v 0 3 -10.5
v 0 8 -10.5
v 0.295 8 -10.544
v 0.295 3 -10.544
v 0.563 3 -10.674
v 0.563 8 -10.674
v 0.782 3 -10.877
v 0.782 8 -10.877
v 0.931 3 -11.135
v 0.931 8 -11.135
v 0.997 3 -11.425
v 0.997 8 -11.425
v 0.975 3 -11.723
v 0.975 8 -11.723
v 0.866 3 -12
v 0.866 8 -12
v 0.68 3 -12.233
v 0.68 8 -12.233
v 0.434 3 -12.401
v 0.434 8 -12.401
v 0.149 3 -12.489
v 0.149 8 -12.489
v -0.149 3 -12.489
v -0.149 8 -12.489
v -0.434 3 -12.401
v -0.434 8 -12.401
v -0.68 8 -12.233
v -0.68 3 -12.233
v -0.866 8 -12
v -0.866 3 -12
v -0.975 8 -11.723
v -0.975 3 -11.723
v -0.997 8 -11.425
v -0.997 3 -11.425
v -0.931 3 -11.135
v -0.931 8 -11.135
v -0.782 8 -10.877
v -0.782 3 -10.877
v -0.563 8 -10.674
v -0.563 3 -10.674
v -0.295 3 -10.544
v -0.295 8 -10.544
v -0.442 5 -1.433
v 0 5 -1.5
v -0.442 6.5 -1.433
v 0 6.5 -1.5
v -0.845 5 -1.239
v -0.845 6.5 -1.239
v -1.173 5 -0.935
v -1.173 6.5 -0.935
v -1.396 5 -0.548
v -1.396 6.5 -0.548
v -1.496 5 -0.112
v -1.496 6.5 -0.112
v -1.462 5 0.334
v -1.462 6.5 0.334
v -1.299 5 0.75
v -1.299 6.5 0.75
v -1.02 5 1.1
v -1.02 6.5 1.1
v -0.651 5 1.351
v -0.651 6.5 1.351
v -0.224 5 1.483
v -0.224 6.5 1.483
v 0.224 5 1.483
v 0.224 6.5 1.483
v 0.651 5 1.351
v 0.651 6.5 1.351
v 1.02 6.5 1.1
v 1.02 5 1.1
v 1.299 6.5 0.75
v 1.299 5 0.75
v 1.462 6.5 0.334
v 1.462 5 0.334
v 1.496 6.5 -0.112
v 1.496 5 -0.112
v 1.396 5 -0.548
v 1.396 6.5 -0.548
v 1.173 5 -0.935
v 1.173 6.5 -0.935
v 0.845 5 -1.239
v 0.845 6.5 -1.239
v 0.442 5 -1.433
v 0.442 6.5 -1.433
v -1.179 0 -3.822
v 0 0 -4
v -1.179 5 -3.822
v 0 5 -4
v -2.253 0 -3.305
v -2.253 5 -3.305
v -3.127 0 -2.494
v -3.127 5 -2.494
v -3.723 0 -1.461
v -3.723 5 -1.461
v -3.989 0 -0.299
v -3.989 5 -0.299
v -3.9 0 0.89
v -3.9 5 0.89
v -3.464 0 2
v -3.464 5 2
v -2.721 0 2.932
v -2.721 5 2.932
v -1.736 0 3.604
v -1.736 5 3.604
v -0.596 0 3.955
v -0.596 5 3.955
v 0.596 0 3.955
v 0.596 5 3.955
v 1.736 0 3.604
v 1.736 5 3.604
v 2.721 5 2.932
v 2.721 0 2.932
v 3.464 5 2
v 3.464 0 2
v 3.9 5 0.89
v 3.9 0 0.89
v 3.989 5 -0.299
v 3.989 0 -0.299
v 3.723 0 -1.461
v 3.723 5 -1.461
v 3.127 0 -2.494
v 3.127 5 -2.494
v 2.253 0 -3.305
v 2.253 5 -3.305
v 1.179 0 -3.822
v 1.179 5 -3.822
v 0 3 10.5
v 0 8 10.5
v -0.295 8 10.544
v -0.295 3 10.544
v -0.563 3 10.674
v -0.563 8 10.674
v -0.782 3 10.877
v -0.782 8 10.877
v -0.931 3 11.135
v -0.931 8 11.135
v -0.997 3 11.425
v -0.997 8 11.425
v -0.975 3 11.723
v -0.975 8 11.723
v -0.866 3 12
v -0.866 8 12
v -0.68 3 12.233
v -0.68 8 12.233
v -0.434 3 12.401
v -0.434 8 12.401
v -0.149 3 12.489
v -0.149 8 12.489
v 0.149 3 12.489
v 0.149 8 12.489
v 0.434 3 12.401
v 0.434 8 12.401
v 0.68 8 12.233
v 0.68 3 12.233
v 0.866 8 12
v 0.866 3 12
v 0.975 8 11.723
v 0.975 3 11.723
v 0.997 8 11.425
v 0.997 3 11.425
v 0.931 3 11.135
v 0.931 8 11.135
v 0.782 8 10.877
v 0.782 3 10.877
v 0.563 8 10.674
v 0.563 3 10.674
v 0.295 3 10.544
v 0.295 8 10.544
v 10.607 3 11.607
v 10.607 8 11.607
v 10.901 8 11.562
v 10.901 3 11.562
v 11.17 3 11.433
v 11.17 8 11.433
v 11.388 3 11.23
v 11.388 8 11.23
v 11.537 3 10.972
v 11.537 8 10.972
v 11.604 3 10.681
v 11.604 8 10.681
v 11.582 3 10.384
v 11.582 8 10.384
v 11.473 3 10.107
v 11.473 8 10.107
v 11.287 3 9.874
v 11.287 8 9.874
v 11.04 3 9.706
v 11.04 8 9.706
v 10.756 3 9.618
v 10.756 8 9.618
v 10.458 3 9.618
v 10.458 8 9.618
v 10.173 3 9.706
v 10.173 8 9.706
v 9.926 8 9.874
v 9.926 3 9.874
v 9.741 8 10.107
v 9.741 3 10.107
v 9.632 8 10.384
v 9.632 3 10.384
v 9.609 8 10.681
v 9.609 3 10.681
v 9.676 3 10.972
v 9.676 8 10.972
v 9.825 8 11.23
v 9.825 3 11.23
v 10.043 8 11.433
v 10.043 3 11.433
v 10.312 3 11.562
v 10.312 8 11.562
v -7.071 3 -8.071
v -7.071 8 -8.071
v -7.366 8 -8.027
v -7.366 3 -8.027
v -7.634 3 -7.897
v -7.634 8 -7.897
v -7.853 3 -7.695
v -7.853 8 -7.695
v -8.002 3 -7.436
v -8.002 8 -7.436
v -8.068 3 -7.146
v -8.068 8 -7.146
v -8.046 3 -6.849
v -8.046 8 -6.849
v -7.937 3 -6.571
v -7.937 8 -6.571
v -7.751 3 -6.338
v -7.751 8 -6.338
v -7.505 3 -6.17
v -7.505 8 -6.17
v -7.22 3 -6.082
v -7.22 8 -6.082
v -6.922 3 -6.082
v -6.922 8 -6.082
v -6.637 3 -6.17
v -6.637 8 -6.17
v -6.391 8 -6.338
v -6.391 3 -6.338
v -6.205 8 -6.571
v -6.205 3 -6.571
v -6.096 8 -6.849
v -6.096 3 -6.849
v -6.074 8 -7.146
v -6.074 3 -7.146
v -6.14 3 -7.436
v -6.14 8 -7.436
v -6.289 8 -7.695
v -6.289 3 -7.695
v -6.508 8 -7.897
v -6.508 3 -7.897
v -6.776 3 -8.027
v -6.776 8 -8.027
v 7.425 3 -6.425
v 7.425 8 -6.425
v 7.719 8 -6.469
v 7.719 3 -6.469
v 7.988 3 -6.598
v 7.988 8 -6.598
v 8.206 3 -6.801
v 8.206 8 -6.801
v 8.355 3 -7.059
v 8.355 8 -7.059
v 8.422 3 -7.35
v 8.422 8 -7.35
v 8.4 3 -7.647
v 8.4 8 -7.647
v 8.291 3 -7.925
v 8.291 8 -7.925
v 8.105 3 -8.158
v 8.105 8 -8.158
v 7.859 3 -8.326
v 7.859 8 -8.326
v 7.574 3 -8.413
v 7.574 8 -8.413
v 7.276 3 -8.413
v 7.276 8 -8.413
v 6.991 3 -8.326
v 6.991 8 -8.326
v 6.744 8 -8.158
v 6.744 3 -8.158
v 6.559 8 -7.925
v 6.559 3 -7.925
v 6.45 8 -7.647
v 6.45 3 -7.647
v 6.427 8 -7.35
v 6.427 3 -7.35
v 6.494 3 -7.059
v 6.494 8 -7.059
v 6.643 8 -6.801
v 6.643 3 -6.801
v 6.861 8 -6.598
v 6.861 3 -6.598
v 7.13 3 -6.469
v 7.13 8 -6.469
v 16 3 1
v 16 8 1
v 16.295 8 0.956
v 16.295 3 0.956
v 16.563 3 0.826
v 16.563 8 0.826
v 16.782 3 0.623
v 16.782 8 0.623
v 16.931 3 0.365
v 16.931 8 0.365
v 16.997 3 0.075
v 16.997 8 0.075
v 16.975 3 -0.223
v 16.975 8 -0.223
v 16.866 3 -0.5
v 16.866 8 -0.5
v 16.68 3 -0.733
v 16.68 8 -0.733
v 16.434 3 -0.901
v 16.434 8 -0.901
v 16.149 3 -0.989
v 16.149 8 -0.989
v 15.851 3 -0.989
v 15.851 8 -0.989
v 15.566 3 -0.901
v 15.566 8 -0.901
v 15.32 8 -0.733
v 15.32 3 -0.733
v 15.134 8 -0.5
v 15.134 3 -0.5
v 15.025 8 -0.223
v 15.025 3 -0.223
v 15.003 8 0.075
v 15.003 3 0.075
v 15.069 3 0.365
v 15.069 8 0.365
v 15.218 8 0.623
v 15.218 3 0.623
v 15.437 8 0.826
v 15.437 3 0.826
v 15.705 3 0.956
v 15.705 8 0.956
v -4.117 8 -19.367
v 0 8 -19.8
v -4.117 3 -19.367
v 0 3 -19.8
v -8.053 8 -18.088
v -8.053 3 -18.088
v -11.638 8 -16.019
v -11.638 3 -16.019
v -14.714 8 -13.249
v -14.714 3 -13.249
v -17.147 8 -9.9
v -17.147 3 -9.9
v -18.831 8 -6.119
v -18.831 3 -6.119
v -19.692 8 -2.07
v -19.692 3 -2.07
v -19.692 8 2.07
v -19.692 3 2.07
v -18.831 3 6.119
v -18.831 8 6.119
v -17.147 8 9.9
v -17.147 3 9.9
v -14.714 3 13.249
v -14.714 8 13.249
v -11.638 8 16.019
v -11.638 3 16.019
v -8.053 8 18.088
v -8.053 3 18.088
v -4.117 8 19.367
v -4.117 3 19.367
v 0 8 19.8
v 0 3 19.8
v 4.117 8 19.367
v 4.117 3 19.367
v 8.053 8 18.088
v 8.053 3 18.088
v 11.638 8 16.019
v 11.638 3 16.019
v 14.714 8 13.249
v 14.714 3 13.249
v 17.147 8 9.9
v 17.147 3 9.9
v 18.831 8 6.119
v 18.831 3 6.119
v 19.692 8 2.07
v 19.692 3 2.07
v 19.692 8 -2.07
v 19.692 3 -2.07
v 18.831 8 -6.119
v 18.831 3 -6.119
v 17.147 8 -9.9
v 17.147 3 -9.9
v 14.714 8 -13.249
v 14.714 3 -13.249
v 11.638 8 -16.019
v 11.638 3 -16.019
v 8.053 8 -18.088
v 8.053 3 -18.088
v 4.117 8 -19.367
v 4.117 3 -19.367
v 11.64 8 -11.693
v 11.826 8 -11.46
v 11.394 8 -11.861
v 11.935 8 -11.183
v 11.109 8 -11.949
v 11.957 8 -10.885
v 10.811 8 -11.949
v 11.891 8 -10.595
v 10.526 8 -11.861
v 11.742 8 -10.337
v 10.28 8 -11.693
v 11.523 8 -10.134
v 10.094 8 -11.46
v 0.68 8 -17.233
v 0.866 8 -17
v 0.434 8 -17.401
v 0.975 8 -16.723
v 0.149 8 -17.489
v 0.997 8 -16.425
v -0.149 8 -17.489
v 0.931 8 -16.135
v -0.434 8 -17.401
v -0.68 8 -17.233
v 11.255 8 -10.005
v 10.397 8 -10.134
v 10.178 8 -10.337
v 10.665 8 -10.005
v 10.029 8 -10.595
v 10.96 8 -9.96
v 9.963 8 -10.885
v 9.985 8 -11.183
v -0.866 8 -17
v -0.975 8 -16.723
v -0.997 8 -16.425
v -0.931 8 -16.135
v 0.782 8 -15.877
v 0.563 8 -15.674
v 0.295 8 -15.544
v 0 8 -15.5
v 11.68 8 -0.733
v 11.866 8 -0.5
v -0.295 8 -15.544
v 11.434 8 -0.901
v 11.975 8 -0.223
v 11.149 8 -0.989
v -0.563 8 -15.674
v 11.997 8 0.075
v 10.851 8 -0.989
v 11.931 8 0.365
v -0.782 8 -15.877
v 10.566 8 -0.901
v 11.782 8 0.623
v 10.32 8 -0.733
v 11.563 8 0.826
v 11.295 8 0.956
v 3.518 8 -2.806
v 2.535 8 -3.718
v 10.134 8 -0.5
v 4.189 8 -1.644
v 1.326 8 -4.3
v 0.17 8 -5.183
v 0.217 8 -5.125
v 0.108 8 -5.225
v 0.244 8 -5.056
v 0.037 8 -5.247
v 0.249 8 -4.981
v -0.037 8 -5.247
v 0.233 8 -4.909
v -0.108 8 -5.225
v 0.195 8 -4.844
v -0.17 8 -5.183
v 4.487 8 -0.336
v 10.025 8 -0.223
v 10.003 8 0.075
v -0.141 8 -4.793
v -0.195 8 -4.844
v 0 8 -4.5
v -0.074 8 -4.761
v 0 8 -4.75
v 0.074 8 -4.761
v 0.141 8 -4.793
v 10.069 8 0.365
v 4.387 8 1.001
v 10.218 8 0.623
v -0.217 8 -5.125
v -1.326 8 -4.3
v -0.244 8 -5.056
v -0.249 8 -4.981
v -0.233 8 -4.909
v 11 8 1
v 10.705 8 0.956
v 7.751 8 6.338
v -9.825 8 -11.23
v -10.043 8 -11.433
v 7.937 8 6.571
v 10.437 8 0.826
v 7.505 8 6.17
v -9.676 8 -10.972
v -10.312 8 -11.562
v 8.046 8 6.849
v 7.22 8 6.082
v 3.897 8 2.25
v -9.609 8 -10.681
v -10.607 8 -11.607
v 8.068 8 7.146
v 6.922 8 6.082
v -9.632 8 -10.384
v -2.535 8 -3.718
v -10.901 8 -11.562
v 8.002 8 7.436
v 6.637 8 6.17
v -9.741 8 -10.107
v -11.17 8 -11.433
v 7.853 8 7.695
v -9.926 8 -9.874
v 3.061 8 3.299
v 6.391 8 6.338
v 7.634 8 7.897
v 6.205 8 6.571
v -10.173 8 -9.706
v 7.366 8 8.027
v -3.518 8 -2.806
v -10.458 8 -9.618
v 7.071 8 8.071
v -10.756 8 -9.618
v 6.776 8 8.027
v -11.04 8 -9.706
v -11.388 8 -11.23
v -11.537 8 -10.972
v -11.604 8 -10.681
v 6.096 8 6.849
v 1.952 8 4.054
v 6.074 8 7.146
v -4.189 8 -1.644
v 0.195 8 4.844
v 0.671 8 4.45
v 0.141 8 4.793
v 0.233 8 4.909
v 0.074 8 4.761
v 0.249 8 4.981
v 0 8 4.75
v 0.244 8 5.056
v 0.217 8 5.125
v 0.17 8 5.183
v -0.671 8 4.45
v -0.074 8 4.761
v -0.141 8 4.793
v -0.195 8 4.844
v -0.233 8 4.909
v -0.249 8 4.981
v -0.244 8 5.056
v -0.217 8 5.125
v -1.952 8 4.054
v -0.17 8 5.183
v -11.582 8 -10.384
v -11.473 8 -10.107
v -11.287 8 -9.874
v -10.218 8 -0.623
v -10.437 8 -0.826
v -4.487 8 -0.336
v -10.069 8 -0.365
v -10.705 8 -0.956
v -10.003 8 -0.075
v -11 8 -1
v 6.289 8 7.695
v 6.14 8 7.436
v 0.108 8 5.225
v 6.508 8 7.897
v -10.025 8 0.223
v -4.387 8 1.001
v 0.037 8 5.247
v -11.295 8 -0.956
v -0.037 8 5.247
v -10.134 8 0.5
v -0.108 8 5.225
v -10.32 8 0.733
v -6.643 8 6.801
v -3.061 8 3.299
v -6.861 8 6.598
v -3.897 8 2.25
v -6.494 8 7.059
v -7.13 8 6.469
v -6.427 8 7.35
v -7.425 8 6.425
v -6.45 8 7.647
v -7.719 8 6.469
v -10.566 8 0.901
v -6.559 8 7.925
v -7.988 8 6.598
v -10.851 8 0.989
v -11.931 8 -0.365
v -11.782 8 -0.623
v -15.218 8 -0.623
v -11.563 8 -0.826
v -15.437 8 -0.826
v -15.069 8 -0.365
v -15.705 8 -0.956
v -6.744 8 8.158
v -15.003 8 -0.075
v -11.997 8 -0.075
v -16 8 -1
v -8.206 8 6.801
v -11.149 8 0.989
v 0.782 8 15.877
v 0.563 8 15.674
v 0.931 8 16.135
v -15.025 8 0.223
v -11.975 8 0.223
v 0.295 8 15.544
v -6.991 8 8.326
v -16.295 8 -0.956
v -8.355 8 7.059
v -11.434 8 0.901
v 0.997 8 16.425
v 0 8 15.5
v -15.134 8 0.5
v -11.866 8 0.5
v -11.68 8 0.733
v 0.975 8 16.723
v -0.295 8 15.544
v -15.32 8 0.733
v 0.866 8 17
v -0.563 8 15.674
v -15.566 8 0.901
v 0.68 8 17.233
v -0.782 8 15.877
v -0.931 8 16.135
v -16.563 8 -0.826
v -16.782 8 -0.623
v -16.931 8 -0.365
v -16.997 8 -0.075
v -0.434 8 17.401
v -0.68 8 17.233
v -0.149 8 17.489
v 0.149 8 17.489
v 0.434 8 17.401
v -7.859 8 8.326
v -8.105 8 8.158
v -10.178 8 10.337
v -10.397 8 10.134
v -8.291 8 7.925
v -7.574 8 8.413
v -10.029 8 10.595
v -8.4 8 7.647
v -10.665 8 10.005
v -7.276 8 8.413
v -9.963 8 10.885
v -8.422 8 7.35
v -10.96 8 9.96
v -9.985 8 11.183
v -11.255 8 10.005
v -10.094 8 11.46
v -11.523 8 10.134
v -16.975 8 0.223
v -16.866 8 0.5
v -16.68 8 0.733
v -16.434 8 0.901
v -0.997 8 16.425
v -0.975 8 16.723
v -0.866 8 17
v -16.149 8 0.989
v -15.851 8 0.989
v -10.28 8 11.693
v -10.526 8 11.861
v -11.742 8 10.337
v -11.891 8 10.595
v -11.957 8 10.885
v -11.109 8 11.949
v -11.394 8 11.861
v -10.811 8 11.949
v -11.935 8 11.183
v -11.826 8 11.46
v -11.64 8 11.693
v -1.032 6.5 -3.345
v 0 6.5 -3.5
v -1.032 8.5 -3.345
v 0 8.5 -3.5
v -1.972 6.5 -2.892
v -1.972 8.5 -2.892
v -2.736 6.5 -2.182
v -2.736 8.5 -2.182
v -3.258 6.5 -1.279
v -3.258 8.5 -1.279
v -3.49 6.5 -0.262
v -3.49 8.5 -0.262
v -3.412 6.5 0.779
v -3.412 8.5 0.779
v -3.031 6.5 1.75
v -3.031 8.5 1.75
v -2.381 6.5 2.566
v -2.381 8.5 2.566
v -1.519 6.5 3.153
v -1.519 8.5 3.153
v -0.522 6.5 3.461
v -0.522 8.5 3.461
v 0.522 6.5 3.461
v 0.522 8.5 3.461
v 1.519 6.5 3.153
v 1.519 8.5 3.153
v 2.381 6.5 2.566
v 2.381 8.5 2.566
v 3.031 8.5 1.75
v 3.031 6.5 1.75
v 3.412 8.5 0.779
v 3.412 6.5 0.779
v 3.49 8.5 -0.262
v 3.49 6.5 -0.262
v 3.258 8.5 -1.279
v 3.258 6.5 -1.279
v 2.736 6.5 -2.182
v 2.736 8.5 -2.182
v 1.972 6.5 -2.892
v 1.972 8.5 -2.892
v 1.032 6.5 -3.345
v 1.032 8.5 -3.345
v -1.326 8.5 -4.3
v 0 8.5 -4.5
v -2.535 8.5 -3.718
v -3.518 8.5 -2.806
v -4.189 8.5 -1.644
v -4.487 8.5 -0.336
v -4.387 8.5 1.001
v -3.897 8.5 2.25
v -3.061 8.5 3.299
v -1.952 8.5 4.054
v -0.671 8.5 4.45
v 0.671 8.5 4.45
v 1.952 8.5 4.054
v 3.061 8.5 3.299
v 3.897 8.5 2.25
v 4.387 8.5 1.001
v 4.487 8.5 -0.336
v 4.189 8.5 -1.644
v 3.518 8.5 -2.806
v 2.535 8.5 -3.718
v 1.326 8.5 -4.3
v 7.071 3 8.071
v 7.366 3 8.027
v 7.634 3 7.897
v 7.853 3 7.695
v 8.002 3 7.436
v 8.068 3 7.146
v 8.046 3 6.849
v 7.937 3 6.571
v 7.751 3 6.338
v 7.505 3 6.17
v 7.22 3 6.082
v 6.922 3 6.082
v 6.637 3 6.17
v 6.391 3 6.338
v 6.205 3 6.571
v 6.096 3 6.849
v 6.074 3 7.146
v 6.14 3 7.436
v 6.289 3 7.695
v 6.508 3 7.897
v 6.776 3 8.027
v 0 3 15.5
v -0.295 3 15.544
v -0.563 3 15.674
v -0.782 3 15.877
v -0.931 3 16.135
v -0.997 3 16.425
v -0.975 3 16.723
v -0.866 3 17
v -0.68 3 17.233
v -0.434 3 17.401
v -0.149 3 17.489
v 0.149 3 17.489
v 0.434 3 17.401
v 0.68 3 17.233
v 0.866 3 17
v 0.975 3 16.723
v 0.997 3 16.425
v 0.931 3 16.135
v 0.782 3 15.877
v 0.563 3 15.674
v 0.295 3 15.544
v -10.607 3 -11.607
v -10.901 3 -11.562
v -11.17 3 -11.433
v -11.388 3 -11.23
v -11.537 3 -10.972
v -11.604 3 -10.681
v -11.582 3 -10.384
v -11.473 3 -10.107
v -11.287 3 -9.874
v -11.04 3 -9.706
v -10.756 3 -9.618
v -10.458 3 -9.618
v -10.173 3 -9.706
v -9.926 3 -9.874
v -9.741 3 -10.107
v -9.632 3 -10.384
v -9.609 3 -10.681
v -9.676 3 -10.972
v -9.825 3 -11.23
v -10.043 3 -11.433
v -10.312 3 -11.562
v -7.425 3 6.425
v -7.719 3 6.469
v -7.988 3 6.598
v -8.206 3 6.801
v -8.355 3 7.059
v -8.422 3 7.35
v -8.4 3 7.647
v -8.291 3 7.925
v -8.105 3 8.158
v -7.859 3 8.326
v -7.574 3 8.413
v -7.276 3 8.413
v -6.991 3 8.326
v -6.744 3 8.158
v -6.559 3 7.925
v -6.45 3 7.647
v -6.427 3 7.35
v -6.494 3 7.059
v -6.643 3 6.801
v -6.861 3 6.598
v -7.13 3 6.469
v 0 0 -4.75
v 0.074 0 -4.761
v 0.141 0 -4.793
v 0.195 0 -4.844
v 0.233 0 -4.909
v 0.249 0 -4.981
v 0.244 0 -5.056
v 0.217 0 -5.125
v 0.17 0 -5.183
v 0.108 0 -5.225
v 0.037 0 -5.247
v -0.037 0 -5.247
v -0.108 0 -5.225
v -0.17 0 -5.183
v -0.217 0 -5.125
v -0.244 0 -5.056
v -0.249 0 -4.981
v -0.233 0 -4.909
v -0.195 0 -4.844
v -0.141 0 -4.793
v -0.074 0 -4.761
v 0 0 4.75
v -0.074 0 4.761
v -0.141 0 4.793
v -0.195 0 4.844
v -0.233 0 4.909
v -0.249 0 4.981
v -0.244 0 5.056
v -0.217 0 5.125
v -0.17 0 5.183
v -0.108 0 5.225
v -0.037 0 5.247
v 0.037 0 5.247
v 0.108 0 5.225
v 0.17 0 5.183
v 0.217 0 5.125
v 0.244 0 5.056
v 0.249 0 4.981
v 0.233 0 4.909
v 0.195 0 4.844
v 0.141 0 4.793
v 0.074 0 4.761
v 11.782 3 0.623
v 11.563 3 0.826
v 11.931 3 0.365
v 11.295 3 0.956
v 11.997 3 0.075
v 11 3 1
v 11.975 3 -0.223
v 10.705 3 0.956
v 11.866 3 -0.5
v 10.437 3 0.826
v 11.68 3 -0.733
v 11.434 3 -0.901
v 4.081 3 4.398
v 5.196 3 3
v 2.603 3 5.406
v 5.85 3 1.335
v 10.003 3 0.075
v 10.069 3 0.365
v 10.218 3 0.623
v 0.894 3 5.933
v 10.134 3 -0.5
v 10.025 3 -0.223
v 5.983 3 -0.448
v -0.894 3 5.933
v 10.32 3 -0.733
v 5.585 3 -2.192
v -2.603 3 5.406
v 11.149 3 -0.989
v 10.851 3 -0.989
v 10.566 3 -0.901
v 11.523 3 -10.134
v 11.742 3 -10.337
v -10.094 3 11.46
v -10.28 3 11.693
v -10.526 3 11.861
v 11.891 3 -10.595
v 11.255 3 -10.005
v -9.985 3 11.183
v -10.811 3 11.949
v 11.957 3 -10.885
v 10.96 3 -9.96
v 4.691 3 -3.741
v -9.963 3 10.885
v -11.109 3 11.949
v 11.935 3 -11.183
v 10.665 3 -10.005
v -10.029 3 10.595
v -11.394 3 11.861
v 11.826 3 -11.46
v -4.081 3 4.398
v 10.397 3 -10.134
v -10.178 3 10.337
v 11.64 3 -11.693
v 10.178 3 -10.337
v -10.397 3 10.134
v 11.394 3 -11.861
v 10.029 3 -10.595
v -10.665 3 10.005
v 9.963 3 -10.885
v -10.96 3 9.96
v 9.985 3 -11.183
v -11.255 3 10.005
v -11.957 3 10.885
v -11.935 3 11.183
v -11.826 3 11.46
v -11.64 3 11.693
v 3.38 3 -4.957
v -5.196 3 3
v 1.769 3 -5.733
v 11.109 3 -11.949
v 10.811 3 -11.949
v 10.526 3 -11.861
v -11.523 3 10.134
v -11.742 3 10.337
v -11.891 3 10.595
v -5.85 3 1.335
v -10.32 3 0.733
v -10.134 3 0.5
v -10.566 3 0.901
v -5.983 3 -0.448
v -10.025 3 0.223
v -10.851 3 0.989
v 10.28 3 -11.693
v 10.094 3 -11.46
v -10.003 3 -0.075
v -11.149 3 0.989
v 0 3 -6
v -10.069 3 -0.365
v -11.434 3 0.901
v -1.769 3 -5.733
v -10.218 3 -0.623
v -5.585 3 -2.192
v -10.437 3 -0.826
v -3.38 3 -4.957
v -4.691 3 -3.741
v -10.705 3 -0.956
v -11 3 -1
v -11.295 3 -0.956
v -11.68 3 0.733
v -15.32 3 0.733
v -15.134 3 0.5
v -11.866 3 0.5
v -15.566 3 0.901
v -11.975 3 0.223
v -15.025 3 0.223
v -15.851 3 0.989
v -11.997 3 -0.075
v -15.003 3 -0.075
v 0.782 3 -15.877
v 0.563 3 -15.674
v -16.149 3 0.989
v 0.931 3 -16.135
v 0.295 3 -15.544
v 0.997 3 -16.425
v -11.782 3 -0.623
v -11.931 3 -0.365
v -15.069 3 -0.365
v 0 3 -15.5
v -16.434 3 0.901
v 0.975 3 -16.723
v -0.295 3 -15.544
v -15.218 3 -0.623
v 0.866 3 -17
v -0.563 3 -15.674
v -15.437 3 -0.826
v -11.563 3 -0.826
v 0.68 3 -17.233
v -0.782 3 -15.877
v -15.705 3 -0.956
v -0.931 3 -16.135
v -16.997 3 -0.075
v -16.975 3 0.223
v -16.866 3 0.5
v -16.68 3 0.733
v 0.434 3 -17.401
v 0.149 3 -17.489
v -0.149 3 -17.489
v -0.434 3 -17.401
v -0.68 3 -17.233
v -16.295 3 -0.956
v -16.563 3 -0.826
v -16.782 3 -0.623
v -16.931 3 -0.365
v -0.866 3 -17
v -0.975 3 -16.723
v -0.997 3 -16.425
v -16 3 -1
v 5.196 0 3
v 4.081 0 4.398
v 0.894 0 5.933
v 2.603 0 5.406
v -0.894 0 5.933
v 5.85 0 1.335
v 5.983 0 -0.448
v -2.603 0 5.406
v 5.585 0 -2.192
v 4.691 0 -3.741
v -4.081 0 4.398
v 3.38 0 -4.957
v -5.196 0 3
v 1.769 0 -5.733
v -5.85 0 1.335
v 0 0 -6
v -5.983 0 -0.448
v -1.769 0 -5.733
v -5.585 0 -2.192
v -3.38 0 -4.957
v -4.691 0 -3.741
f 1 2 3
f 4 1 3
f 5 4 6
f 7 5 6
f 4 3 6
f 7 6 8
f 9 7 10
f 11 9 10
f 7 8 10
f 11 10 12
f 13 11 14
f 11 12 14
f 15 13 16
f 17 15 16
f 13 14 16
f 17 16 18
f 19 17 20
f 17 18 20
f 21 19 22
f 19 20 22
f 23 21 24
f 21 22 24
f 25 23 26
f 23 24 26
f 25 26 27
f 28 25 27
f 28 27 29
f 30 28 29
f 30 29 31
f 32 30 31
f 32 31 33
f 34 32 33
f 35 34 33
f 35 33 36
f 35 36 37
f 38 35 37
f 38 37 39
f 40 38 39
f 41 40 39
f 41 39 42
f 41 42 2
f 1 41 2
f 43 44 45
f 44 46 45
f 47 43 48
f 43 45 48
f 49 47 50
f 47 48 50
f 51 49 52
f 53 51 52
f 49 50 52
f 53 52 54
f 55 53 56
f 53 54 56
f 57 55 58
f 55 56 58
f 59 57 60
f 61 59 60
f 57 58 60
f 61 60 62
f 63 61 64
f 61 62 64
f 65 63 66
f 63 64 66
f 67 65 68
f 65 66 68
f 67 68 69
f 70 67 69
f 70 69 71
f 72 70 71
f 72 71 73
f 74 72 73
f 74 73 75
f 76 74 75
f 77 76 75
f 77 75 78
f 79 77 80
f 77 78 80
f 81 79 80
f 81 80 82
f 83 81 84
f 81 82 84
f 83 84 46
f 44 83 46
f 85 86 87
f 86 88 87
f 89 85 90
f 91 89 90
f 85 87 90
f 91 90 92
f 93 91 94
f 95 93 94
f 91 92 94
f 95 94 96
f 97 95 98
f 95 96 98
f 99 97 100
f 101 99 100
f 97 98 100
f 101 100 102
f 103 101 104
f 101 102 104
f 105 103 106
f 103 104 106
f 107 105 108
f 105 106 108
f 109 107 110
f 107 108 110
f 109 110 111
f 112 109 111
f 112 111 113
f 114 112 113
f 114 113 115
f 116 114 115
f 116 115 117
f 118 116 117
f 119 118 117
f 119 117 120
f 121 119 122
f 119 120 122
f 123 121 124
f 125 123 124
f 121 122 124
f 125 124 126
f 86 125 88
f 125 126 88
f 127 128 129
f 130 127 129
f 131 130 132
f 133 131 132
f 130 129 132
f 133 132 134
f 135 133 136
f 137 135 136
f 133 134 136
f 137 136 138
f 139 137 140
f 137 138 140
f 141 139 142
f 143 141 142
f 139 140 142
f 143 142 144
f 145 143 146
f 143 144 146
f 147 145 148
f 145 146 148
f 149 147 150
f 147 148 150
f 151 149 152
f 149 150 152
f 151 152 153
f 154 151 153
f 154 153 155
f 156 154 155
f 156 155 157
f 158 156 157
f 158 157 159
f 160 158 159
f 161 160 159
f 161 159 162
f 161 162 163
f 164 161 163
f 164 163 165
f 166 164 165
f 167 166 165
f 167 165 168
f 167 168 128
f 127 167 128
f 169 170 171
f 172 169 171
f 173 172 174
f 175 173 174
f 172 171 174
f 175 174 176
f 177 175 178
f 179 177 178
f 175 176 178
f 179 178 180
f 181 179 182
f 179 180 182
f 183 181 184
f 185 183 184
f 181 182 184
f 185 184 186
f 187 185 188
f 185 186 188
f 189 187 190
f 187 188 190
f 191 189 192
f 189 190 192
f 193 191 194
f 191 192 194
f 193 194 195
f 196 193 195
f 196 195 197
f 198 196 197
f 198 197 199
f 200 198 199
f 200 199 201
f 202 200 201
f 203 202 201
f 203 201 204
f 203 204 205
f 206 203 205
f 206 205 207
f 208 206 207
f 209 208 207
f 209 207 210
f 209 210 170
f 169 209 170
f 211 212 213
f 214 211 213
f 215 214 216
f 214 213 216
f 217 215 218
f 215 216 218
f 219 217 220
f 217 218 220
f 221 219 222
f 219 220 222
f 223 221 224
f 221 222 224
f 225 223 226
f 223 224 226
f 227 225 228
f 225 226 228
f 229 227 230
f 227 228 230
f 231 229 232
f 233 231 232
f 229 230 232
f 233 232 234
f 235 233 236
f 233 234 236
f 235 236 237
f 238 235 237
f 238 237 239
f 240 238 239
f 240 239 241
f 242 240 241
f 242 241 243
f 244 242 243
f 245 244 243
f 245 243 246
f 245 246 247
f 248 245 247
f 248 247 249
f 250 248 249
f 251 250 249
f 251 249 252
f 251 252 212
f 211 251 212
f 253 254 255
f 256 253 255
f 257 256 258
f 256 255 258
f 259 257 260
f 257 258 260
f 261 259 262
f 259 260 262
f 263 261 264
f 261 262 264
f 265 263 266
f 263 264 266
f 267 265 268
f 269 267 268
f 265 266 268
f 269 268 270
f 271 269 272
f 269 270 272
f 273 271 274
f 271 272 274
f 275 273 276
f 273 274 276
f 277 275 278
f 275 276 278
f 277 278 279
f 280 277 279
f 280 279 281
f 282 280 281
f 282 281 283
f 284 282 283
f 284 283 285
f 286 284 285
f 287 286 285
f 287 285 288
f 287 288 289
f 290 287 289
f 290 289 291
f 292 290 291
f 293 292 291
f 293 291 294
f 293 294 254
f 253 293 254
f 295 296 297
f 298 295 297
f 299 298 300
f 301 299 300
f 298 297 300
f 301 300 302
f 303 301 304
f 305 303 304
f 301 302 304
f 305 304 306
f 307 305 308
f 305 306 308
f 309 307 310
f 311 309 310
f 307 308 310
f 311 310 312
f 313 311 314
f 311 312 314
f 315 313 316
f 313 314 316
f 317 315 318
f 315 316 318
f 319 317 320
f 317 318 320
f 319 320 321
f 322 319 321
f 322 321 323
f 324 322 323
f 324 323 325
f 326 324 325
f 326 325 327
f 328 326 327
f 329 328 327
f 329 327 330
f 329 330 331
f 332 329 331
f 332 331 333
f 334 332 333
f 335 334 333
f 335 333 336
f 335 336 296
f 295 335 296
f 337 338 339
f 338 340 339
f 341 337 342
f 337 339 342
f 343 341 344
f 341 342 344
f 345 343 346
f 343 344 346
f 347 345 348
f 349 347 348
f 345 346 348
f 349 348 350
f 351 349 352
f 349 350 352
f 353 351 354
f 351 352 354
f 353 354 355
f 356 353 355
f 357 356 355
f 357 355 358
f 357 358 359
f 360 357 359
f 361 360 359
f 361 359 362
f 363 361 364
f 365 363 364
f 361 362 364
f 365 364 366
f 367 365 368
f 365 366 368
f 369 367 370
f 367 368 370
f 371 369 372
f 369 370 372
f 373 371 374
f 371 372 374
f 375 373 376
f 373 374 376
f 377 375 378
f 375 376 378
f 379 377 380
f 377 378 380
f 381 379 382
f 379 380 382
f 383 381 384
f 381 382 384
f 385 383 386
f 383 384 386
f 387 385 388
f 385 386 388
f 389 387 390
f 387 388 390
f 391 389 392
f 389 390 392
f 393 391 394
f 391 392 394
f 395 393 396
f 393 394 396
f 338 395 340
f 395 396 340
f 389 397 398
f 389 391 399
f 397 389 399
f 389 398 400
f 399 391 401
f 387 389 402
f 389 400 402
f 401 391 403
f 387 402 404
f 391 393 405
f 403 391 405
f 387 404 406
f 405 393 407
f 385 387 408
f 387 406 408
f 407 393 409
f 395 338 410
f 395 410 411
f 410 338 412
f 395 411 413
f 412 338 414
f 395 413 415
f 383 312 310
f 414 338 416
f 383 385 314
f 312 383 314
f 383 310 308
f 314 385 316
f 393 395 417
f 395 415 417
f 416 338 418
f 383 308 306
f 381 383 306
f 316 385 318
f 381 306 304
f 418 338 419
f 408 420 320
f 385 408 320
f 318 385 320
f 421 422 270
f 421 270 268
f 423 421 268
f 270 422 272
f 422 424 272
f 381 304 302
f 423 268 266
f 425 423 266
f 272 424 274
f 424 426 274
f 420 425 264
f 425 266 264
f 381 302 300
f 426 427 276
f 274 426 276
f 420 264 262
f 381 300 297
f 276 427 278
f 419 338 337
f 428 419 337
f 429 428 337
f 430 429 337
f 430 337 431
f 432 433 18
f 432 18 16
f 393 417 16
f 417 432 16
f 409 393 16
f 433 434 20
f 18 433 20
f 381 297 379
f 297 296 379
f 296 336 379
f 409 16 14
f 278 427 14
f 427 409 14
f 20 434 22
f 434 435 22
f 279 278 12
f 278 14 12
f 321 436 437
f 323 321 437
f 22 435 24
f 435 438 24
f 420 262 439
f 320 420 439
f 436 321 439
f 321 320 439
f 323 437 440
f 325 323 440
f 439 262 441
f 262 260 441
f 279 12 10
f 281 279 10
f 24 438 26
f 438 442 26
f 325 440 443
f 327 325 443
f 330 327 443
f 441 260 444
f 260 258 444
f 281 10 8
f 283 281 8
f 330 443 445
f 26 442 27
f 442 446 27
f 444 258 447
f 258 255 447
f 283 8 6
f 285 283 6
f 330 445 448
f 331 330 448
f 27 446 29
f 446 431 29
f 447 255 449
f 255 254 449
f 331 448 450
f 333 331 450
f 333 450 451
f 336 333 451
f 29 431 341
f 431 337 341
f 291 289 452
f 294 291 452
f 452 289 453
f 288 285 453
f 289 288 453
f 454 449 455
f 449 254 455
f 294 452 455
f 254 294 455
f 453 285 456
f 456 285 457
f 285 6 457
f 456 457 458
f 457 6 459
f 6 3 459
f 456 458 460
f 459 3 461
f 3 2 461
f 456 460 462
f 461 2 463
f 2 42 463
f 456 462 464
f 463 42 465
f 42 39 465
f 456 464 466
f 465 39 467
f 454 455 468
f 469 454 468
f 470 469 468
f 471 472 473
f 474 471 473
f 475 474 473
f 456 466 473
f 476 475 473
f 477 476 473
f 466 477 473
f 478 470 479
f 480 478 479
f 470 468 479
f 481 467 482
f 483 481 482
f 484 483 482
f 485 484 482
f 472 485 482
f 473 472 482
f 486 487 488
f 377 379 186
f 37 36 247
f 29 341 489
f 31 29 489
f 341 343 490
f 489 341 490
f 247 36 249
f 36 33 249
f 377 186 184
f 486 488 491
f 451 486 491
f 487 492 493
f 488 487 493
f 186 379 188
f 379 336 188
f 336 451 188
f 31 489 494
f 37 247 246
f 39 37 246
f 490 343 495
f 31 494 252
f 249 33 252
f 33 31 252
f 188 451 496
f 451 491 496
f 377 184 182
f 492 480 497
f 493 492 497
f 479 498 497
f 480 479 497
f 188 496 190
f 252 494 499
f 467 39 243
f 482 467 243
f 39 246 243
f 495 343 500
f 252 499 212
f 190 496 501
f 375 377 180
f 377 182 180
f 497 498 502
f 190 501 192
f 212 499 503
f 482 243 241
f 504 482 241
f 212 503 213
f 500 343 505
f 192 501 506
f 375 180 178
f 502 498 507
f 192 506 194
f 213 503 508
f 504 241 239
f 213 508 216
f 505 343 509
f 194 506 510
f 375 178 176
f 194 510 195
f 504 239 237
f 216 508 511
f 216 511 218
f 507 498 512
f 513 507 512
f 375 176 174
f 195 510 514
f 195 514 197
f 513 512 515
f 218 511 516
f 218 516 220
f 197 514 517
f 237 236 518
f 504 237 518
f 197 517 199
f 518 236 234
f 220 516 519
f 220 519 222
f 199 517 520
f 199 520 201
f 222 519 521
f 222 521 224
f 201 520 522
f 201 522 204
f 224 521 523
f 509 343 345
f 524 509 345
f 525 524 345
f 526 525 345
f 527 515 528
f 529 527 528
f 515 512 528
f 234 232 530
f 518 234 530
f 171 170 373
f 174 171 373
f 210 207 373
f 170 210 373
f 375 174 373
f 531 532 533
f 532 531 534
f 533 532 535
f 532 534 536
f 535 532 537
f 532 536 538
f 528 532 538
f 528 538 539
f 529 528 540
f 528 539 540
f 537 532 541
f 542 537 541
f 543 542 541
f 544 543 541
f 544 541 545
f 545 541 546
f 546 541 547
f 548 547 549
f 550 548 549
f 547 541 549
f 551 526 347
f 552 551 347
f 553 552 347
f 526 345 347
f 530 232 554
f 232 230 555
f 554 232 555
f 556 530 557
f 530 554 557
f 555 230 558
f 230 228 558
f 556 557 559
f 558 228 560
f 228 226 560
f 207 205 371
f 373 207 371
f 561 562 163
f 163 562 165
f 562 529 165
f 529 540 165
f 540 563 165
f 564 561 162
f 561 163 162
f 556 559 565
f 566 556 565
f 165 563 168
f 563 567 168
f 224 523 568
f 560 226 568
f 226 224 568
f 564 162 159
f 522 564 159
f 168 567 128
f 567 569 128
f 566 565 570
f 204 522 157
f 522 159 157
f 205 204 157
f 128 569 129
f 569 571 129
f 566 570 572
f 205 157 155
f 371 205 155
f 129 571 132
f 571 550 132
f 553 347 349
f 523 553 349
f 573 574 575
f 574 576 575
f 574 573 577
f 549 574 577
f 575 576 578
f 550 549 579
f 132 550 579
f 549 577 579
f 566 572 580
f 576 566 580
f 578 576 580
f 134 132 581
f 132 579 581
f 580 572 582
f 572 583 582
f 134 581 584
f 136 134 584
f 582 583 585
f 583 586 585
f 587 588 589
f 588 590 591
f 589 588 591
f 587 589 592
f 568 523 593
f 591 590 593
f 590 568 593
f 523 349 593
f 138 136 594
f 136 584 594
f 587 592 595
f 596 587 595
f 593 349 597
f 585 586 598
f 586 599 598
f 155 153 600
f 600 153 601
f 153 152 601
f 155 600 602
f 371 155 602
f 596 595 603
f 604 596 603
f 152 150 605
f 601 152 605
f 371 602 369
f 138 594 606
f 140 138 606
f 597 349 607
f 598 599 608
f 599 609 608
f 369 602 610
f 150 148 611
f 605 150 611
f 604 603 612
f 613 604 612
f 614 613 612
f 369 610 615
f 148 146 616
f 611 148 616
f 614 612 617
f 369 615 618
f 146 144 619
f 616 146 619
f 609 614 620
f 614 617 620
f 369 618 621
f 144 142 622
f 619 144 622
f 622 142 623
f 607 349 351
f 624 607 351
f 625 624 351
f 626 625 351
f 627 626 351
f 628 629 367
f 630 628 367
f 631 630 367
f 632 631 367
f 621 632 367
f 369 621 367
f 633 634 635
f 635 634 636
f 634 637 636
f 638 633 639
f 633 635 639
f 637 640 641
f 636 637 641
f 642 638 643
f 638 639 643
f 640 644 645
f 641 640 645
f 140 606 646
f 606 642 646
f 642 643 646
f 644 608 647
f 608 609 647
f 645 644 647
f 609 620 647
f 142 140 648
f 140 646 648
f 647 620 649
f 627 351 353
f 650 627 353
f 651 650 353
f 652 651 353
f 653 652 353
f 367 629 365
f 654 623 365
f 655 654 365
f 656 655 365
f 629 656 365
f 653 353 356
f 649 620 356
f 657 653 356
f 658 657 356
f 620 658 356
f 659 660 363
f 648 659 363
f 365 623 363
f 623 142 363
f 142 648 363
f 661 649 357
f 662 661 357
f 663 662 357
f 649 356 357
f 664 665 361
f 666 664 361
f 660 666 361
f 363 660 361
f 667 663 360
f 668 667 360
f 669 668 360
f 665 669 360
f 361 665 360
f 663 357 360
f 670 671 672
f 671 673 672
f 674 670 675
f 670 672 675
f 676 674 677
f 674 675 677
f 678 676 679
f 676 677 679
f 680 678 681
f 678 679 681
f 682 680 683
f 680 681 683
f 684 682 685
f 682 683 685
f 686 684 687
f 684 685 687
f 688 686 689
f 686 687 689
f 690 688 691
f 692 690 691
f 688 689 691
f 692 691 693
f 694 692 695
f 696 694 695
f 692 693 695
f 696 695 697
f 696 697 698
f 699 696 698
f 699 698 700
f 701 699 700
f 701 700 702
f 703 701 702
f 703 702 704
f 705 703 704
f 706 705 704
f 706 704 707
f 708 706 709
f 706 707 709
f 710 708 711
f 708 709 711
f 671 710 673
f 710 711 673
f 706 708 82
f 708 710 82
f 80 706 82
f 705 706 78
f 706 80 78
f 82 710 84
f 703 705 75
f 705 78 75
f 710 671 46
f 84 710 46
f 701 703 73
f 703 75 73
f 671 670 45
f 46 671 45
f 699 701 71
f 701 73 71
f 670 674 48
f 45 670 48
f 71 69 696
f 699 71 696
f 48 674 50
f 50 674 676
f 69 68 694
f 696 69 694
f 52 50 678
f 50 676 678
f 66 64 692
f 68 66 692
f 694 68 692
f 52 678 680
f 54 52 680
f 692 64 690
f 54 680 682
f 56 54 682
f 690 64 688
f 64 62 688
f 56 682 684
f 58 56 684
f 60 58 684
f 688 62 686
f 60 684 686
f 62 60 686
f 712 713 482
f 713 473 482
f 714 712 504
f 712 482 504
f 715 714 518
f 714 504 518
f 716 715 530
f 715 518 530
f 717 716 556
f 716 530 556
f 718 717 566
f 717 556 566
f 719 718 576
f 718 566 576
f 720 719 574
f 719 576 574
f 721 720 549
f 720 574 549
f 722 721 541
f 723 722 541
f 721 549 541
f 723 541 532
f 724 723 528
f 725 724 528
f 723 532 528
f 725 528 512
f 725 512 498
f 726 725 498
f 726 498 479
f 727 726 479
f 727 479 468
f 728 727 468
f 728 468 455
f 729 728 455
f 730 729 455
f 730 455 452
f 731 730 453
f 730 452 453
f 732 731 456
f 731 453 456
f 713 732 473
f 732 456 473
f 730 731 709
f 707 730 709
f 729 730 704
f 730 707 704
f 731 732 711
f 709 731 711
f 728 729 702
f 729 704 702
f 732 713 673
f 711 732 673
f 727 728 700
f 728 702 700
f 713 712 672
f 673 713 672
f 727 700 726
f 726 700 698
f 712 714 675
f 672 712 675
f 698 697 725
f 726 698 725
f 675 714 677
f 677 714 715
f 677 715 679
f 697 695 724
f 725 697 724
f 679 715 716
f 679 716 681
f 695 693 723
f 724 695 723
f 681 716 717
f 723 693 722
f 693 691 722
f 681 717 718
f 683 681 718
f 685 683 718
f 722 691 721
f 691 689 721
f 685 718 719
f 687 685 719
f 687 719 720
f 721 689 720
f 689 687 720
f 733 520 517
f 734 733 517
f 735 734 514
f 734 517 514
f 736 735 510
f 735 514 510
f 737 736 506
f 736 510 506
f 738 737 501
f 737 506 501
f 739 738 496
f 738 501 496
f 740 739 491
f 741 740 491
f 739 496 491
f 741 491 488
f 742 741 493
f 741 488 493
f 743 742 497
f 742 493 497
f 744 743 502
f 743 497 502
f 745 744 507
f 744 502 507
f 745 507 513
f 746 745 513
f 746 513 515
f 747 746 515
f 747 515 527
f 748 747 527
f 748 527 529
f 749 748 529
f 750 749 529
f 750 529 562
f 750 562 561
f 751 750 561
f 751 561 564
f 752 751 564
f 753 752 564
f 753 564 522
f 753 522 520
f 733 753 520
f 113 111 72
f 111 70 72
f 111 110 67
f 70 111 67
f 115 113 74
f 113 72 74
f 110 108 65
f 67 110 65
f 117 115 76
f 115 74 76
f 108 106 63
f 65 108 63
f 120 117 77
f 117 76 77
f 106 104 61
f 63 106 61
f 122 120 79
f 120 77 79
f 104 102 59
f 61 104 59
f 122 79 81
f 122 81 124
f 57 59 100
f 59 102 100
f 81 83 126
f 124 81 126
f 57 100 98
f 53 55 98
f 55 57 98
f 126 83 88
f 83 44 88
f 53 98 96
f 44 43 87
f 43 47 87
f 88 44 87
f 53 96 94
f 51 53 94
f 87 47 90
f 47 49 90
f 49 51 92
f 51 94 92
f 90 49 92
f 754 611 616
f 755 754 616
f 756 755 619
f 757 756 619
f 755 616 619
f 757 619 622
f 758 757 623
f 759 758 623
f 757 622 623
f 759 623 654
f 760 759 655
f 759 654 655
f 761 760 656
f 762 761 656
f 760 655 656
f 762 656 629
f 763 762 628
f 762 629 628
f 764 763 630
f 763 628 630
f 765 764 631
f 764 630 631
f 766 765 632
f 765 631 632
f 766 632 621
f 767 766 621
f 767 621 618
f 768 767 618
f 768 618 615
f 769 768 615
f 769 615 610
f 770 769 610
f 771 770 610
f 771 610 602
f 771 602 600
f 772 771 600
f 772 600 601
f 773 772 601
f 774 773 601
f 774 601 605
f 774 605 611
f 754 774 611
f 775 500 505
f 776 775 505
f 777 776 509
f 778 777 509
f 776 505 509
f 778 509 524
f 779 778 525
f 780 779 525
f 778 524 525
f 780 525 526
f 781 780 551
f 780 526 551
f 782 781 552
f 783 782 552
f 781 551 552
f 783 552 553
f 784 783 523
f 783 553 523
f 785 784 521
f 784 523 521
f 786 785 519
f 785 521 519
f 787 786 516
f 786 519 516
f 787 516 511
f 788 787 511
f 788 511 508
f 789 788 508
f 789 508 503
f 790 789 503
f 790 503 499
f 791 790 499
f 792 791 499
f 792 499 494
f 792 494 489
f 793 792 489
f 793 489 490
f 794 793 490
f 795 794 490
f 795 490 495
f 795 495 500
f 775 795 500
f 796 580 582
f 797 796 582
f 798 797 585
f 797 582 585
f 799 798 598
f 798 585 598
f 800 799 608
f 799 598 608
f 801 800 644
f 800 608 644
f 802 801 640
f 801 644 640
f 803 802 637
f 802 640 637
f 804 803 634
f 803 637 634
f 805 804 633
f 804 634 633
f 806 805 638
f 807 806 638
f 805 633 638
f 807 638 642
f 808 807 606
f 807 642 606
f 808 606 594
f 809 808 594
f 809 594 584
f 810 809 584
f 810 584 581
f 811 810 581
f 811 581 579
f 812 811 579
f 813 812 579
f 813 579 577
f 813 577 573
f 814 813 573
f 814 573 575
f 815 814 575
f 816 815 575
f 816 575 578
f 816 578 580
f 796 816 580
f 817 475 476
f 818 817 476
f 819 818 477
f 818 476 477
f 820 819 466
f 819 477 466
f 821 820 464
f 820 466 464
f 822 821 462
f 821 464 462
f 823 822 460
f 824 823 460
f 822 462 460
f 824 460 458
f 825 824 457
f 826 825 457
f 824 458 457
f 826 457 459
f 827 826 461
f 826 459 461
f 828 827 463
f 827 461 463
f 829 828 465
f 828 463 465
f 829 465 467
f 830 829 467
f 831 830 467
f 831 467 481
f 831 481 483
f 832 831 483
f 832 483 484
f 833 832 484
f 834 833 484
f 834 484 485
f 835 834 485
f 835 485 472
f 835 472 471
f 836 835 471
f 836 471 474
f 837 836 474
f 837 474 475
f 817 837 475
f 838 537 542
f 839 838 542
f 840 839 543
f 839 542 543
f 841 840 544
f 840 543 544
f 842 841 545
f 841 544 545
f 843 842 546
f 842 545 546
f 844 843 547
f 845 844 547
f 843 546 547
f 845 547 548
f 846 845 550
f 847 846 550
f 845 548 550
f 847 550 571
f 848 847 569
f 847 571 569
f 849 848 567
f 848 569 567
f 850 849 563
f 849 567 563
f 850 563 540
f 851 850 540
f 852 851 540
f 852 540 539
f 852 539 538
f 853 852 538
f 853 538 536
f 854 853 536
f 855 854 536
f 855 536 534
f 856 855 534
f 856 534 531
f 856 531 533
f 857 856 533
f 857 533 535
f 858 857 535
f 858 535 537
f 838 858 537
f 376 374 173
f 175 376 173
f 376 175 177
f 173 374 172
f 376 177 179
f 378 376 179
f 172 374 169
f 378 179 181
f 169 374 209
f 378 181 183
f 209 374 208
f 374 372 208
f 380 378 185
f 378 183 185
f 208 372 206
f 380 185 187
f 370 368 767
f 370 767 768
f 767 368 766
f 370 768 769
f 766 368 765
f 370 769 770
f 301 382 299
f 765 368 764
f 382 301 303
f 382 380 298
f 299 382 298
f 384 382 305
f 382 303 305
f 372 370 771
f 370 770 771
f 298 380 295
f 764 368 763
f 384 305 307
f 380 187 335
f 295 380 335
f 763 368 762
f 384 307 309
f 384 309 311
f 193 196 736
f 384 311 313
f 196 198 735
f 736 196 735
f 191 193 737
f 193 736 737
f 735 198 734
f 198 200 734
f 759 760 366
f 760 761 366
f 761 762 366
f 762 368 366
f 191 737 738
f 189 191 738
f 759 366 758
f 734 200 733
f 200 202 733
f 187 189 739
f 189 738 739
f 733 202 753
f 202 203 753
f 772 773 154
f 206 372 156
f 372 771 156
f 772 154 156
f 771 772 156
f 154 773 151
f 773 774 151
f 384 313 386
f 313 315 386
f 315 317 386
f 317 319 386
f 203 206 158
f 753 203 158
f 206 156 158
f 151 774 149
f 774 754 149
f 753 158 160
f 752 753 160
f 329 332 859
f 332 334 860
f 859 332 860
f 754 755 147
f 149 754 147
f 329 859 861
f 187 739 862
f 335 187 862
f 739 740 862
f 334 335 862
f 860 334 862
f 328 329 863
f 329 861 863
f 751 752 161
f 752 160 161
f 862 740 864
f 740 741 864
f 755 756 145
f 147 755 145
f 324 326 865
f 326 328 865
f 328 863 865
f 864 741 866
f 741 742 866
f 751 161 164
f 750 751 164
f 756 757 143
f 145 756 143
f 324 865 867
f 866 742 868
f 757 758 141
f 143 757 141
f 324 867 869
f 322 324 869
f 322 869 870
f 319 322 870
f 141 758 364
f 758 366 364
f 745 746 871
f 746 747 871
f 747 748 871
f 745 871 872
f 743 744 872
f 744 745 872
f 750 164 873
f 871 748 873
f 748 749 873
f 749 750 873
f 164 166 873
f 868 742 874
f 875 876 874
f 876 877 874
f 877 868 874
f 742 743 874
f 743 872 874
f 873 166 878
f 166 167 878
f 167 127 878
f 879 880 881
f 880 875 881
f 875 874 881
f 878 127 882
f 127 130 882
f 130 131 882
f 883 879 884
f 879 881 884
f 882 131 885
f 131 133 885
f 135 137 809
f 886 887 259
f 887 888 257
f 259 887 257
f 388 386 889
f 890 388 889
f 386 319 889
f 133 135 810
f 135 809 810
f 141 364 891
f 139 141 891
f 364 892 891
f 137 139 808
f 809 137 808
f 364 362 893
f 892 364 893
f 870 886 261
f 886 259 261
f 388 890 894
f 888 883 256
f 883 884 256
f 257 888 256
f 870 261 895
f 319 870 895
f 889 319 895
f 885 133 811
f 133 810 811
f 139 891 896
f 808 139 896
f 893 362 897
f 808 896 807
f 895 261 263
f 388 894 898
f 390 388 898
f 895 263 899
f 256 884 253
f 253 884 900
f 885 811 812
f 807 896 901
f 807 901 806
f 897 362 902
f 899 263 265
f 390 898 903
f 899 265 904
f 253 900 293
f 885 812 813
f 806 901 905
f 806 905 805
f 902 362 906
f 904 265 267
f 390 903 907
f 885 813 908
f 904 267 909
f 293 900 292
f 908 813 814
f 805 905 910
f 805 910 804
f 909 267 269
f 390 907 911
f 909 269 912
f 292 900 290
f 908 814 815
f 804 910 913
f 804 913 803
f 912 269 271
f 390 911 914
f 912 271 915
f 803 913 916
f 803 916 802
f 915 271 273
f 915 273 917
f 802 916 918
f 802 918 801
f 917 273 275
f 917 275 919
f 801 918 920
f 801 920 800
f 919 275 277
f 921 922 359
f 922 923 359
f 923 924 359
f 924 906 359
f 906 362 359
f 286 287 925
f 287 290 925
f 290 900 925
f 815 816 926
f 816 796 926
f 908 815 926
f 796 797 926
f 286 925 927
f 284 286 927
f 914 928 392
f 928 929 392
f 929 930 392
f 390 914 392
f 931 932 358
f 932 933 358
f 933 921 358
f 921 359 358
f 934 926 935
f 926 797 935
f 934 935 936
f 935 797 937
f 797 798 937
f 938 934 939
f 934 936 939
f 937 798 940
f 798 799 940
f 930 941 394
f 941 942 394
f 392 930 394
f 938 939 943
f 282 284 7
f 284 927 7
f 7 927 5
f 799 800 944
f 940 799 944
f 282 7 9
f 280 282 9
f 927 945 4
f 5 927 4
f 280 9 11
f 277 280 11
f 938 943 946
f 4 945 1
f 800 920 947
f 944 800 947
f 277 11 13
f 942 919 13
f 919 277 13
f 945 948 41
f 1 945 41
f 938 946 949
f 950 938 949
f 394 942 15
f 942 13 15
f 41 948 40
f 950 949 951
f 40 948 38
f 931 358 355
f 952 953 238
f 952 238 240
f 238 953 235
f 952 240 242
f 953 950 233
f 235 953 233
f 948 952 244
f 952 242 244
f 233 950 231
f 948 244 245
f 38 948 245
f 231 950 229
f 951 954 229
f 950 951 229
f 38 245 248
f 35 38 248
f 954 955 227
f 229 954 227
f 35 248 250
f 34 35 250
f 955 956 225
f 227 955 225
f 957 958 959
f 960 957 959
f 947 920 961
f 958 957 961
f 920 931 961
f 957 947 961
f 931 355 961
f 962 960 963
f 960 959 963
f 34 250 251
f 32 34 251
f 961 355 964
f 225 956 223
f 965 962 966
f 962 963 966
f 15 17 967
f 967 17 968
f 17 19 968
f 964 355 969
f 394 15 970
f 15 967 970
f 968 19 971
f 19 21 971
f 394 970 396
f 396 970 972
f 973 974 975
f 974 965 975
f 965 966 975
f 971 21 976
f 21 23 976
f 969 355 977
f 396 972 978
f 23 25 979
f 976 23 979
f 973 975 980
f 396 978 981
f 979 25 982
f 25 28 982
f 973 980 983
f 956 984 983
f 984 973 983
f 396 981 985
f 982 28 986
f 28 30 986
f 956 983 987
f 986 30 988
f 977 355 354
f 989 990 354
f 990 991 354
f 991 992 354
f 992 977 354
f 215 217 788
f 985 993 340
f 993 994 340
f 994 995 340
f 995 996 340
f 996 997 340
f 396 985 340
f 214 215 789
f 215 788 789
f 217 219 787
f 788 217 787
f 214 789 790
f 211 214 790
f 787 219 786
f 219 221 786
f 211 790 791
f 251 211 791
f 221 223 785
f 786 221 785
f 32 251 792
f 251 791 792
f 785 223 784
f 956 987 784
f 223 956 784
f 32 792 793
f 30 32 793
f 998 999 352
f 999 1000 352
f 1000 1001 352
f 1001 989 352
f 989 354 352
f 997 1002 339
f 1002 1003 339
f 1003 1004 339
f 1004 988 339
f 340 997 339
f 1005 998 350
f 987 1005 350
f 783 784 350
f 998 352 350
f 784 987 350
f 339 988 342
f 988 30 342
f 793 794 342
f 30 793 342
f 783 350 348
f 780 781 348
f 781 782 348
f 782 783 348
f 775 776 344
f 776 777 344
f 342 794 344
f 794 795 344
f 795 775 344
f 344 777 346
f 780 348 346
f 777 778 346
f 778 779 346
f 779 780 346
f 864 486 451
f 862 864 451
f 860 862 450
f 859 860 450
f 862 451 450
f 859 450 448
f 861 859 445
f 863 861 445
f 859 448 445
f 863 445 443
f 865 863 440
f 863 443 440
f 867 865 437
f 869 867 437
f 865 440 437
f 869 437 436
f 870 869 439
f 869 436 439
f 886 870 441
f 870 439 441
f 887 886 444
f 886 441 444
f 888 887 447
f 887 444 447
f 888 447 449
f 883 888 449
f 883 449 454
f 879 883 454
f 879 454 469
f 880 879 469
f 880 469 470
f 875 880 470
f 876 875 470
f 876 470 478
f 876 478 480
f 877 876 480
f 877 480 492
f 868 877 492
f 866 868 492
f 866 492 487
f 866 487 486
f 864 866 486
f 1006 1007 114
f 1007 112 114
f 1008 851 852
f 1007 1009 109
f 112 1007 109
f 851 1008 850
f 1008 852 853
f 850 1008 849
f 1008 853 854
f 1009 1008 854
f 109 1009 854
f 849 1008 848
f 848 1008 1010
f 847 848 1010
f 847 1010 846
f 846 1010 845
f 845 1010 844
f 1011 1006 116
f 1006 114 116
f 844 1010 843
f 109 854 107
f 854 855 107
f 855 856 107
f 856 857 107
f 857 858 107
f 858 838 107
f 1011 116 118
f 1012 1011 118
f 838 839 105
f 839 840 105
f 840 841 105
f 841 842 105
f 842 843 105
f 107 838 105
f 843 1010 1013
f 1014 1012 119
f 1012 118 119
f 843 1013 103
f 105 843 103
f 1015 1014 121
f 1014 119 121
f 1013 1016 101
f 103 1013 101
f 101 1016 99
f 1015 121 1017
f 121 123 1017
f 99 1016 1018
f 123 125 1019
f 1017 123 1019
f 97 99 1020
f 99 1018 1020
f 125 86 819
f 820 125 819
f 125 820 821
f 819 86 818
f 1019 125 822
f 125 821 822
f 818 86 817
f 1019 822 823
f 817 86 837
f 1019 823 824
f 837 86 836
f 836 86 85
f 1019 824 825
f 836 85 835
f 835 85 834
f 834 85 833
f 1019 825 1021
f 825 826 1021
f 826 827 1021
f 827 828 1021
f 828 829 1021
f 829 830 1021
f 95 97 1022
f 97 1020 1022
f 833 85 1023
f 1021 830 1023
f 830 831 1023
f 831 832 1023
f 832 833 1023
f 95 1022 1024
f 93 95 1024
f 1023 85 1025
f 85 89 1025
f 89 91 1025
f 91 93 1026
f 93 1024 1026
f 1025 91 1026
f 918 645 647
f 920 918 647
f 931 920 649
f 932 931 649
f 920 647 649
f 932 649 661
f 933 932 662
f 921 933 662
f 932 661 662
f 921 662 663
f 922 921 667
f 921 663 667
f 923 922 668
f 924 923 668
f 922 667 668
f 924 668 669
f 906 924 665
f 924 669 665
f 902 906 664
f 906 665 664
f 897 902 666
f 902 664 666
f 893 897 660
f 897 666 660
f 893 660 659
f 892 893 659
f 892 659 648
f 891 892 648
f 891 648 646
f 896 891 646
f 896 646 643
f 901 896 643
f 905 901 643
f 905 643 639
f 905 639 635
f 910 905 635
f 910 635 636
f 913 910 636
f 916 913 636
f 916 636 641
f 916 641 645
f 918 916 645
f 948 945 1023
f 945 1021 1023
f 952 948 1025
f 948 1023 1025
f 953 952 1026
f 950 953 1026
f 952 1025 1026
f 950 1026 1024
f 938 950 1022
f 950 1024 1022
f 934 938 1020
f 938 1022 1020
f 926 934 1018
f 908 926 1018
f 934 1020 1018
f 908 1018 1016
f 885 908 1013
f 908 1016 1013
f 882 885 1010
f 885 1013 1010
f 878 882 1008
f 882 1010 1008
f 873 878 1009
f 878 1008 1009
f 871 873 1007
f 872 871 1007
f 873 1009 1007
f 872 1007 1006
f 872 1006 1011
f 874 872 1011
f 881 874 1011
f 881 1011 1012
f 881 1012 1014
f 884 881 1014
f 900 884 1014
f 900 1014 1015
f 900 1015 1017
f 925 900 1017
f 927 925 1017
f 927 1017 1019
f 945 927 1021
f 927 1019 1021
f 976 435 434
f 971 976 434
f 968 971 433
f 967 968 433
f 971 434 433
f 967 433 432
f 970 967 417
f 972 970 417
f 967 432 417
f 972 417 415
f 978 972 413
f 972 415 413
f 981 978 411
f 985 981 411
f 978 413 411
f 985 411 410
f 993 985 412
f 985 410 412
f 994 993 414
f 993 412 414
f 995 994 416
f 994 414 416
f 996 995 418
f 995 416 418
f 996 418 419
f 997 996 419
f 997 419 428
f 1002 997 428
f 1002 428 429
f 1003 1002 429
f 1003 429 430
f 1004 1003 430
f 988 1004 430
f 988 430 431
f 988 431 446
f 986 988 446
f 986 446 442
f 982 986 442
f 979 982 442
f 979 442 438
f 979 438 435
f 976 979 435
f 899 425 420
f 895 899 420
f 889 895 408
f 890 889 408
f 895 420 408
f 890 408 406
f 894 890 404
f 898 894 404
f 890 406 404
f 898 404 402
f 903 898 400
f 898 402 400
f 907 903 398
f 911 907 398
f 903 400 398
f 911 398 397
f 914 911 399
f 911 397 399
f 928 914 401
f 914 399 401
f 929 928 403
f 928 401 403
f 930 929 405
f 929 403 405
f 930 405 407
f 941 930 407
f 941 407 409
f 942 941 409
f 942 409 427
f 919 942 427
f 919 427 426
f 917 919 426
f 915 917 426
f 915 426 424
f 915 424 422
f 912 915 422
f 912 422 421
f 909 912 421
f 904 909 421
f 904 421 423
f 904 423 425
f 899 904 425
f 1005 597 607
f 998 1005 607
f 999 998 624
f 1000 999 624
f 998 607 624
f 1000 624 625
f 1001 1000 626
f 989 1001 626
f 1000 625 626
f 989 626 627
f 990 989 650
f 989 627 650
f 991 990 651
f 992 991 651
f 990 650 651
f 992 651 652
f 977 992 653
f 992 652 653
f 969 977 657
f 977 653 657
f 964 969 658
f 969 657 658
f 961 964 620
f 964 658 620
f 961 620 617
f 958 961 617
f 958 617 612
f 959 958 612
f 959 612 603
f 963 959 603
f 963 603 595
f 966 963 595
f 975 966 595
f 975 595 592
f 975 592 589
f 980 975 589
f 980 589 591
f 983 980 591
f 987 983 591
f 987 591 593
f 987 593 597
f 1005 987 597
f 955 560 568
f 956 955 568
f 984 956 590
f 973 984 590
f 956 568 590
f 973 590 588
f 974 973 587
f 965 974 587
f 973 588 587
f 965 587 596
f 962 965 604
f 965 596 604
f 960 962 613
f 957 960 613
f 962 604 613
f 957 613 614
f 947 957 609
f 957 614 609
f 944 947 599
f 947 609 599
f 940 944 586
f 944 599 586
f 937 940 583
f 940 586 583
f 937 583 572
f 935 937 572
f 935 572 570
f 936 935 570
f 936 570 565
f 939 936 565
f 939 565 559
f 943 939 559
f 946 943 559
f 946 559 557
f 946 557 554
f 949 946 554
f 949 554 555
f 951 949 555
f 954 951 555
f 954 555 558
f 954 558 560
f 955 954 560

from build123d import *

# Parameters (mm, degrees)
ESQUISSE2_R                  = 1
ESQUISSE2_R_2                = 0.25
ENL_V_MAT_EXTRU_1_DEPTH      = 10
R_P_TITION_CIRCULAIRE1_COUNT = 2


with BuildPart() as part:
    # Esquisse1 → Révolution1 (revolve)
    with BuildSketch(Plane.XY, mode=Mode.PRIVATE) as r_volution1_sk:
        Polygon((4, 0), (4, 5), (1.5, 5), (1.5, 6.5), (3.5, 6.5), (3.5, 8.5), (4.5, 8.5), (4.5, 8), (19.8, 8), (19.8, 3), (6, 3), (6, 0), align=None)
    revolve(r_volution1_sk.sketch.rotate(Axis((0, 0, 0), (0, 1, 0)), 90), axis=Axis((0, 0, 0), (0, 1, 0)))

    # Esquisse2 → Enlèv. mat.-Extru.1 (cut)
    with BuildSketch(Plane(origin=(0, 8, 0), x_dir=(1, 0, 0), z_dir=(0, 1, 0))):
        with Locations(Location((0, 16.5, 0), (0, 0, 270))):
            Circle(ESQUISSE2_R)
        with Locations(Location((0, 11.5, 0), (0, 0, 270))):
            Circle(ESQUISSE2_R)
        with Locations(Location((0, 5, 0), (0, 0, 270))):
            Circle(ESQUISSE2_R_2)
        with Locations(Location((7.424621202, 7.424621202, 0), (0, 0, 270))):
            Circle(ESQUISSE2_R)
        with Locations(Location((10.960155108, 10.960155108, 0), (0, 0, 270))):
            Circle(ESQUISSE2_R)
        with Locations(Location((11, 0, 0), (0, 0, 270))):
            Circle(ESQUISSE2_R)
        with Locations(Location((16, 0, 0), (0, 0, 270))):
            Circle(ESQUISSE2_R)
        with Locations(Location((10.606601718, -10.606601718, 0), (0, 0, 270))):
            Circle(ESQUISSE2_R)
        with Locations(Location((7.071067812, -7.071067812, 0), (0, 0, 270))):
            Circle(ESQUISSE2_R)
    enl_v_mat_extru_1 = extrude(amount=-ENL_V_MAT_EXTRU_1_DEPTH, mode=Mode.SUBTRACT)

    # Répétition circulaire1: Enlèv. mat.-Extru.1 ×2 about axis
    r_p_tition_circulaire1_axis = Axis((0, 0, 0), (0, 1, 0))
    for i in range(1, R_P_TITION_CIRCULAIRE1_COUNT):
        add(enl_v_mat_extru_1.rotate(r_p_tition_circulaire1_axis, i * 360 / R_P_TITION_CIRCULAIRE1_COUNT), mode=Mode.SUBTRACT)


solid = part.part
